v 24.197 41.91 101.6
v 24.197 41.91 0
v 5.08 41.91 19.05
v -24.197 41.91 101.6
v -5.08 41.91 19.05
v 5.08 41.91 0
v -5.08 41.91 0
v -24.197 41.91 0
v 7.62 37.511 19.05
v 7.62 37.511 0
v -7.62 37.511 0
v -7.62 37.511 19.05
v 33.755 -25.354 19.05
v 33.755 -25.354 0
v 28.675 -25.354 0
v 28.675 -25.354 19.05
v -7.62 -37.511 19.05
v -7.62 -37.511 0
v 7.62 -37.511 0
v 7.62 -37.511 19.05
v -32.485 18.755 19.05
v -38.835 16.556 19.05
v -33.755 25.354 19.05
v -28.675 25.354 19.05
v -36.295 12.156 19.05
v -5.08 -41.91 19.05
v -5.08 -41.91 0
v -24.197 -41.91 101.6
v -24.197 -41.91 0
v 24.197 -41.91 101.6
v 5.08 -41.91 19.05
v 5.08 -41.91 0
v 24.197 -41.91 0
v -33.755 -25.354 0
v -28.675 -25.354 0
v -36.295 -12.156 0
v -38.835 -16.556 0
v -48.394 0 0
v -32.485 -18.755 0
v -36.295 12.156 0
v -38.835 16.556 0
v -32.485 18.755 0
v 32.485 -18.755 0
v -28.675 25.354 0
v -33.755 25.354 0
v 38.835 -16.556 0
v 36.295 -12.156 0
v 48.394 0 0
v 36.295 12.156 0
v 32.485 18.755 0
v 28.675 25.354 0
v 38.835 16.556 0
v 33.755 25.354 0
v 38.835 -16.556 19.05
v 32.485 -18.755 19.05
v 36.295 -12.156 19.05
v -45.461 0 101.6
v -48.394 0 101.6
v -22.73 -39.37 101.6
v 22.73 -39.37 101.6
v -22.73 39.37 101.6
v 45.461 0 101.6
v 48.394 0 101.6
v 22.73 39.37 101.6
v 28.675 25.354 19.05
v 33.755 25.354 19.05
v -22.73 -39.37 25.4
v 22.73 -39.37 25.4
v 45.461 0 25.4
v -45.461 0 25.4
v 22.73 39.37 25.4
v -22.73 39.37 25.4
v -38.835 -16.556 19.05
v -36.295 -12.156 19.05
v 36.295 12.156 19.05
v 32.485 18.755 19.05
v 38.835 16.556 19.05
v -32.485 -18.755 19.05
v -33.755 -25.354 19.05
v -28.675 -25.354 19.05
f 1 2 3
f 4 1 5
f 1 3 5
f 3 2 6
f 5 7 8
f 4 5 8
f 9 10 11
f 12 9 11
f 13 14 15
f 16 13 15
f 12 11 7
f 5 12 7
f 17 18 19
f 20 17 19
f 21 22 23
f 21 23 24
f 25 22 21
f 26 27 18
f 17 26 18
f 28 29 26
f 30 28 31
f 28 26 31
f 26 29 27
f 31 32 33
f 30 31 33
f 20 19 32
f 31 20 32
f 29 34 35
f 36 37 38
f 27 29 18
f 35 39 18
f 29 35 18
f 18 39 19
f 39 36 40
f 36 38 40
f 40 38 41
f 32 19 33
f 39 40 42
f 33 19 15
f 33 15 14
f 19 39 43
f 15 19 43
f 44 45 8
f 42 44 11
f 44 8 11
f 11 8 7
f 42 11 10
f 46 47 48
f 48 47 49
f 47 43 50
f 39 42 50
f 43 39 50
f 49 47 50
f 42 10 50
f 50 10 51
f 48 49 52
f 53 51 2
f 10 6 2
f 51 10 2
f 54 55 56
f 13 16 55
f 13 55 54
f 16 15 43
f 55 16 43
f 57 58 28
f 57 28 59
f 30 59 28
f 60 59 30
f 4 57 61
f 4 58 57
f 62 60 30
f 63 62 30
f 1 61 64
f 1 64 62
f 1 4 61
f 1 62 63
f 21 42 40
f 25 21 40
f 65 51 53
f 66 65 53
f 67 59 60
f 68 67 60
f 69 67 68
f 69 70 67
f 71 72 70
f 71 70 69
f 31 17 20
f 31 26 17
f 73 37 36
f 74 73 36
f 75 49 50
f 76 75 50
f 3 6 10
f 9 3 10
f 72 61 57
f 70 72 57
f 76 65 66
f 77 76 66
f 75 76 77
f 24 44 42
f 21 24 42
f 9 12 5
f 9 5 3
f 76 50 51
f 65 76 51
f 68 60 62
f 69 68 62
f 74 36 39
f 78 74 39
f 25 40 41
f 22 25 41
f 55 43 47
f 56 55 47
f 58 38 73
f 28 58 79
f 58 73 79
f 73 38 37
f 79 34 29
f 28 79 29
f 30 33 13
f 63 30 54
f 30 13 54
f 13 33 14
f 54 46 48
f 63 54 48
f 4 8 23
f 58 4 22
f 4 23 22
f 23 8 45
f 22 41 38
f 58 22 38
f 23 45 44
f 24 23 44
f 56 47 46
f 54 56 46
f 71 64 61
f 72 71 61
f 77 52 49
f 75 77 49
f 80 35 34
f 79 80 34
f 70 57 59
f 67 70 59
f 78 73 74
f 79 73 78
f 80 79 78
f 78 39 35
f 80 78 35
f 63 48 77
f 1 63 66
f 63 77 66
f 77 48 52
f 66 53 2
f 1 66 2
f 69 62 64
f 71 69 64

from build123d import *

# Parameters (mm, degrees)
F1_DEPTH = 101.6
F3_DEPTH = 76.2
F5_DEPTH = 19.05


with BuildPart() as f1:
    # F0 (on Top) → F1 (new body)
    with BuildSketch(Plane.XY):
        Polygon((-24.19675, -41.91), (24.19675, -41.91), (48.3935, 0), (24.19675, 41.91), (-24.19675, 41.91), (-48.3935, 0), align=None)
    extrude(amount=F1_DEPTH)

    # F2 (on face) → F3 (cut)
    with BuildSketch(Plane.XY.offset(101.6)):
        Polygon((-22.73028, -39.37), (22.73028, -39.37), (45.46056, 0), (22.73028, 39.37), (-22.73028, 39.37), (-45.46056, 0), align=None)
    extrude(amount=-F3_DEPTH, mode=Mode.SUBTRACT)

    # F4 (on face) → F5 (cut)
    with BuildSketch(Plane(origin=(0, 0, 0), x_dir=(1, 0, 0), z_dir=(0, 0, -1))):
        Polygon((-7.62, 37.510591), (0, 37.510591), (0, 41.91), (-5.08, 41.91), align=None)
        Polygon((7.62, 37.510591), (5.08, 41.91), (0, 41.91), (0, 37.510591), align=None)
        Polygon((32.485125, 18.755295), (36.295125, 20.955), (33.755125, 25.354409), (28.675125, 25.354409), align=None)
        Polygon((36.295125, 12.156182), (38.835125, 16.555591), (36.295125, 20.955), (32.485125, 18.755295), align=None)
        Polygon((36.295125, -20.955), (38.835125, -16.555591), (36.295125, -12.156182), (32.485125, -18.755295), align=None)
        Polygon((33.755125, -25.354409), (36.295125, -20.955), (32.485125, -18.755295), (28.675125, -25.354409), align=None)
        Polygon((7.62, -37.510591), (0, -37.510591), (0, -41.91), (5.08, -41.91), align=None)
        Polygon((0, -41.91), (0, -37.510591), (-7.62, -37.510591), (-5.08, -41.91), align=None)
        Polygon((-28.675125, -25.354409), (-32.485125, -18.755295), (-36.295125, -20.955), (-33.755125, -25.354409), align=None)
        Polygon((-36.295125, -20.955), (-32.485125, -18.755295), (-36.295125, -12.156182), (-38.835125, -16.555591), align=None)
        Polygon((-36.295125, 20.955), (-32.485125, 18.755295), (-28.675125, 25.354409), (-33.755125, 25.354409), align=None)
        Polygon((-36.295125, 12.156182), (-32.485125, 18.755295), (-36.295125, 20.955), (-38.835125, 16.555591), align=None)
    extrude(amount=-F5_DEPTH, mode=Mode.SUBTRACT)


solid = f1.part
